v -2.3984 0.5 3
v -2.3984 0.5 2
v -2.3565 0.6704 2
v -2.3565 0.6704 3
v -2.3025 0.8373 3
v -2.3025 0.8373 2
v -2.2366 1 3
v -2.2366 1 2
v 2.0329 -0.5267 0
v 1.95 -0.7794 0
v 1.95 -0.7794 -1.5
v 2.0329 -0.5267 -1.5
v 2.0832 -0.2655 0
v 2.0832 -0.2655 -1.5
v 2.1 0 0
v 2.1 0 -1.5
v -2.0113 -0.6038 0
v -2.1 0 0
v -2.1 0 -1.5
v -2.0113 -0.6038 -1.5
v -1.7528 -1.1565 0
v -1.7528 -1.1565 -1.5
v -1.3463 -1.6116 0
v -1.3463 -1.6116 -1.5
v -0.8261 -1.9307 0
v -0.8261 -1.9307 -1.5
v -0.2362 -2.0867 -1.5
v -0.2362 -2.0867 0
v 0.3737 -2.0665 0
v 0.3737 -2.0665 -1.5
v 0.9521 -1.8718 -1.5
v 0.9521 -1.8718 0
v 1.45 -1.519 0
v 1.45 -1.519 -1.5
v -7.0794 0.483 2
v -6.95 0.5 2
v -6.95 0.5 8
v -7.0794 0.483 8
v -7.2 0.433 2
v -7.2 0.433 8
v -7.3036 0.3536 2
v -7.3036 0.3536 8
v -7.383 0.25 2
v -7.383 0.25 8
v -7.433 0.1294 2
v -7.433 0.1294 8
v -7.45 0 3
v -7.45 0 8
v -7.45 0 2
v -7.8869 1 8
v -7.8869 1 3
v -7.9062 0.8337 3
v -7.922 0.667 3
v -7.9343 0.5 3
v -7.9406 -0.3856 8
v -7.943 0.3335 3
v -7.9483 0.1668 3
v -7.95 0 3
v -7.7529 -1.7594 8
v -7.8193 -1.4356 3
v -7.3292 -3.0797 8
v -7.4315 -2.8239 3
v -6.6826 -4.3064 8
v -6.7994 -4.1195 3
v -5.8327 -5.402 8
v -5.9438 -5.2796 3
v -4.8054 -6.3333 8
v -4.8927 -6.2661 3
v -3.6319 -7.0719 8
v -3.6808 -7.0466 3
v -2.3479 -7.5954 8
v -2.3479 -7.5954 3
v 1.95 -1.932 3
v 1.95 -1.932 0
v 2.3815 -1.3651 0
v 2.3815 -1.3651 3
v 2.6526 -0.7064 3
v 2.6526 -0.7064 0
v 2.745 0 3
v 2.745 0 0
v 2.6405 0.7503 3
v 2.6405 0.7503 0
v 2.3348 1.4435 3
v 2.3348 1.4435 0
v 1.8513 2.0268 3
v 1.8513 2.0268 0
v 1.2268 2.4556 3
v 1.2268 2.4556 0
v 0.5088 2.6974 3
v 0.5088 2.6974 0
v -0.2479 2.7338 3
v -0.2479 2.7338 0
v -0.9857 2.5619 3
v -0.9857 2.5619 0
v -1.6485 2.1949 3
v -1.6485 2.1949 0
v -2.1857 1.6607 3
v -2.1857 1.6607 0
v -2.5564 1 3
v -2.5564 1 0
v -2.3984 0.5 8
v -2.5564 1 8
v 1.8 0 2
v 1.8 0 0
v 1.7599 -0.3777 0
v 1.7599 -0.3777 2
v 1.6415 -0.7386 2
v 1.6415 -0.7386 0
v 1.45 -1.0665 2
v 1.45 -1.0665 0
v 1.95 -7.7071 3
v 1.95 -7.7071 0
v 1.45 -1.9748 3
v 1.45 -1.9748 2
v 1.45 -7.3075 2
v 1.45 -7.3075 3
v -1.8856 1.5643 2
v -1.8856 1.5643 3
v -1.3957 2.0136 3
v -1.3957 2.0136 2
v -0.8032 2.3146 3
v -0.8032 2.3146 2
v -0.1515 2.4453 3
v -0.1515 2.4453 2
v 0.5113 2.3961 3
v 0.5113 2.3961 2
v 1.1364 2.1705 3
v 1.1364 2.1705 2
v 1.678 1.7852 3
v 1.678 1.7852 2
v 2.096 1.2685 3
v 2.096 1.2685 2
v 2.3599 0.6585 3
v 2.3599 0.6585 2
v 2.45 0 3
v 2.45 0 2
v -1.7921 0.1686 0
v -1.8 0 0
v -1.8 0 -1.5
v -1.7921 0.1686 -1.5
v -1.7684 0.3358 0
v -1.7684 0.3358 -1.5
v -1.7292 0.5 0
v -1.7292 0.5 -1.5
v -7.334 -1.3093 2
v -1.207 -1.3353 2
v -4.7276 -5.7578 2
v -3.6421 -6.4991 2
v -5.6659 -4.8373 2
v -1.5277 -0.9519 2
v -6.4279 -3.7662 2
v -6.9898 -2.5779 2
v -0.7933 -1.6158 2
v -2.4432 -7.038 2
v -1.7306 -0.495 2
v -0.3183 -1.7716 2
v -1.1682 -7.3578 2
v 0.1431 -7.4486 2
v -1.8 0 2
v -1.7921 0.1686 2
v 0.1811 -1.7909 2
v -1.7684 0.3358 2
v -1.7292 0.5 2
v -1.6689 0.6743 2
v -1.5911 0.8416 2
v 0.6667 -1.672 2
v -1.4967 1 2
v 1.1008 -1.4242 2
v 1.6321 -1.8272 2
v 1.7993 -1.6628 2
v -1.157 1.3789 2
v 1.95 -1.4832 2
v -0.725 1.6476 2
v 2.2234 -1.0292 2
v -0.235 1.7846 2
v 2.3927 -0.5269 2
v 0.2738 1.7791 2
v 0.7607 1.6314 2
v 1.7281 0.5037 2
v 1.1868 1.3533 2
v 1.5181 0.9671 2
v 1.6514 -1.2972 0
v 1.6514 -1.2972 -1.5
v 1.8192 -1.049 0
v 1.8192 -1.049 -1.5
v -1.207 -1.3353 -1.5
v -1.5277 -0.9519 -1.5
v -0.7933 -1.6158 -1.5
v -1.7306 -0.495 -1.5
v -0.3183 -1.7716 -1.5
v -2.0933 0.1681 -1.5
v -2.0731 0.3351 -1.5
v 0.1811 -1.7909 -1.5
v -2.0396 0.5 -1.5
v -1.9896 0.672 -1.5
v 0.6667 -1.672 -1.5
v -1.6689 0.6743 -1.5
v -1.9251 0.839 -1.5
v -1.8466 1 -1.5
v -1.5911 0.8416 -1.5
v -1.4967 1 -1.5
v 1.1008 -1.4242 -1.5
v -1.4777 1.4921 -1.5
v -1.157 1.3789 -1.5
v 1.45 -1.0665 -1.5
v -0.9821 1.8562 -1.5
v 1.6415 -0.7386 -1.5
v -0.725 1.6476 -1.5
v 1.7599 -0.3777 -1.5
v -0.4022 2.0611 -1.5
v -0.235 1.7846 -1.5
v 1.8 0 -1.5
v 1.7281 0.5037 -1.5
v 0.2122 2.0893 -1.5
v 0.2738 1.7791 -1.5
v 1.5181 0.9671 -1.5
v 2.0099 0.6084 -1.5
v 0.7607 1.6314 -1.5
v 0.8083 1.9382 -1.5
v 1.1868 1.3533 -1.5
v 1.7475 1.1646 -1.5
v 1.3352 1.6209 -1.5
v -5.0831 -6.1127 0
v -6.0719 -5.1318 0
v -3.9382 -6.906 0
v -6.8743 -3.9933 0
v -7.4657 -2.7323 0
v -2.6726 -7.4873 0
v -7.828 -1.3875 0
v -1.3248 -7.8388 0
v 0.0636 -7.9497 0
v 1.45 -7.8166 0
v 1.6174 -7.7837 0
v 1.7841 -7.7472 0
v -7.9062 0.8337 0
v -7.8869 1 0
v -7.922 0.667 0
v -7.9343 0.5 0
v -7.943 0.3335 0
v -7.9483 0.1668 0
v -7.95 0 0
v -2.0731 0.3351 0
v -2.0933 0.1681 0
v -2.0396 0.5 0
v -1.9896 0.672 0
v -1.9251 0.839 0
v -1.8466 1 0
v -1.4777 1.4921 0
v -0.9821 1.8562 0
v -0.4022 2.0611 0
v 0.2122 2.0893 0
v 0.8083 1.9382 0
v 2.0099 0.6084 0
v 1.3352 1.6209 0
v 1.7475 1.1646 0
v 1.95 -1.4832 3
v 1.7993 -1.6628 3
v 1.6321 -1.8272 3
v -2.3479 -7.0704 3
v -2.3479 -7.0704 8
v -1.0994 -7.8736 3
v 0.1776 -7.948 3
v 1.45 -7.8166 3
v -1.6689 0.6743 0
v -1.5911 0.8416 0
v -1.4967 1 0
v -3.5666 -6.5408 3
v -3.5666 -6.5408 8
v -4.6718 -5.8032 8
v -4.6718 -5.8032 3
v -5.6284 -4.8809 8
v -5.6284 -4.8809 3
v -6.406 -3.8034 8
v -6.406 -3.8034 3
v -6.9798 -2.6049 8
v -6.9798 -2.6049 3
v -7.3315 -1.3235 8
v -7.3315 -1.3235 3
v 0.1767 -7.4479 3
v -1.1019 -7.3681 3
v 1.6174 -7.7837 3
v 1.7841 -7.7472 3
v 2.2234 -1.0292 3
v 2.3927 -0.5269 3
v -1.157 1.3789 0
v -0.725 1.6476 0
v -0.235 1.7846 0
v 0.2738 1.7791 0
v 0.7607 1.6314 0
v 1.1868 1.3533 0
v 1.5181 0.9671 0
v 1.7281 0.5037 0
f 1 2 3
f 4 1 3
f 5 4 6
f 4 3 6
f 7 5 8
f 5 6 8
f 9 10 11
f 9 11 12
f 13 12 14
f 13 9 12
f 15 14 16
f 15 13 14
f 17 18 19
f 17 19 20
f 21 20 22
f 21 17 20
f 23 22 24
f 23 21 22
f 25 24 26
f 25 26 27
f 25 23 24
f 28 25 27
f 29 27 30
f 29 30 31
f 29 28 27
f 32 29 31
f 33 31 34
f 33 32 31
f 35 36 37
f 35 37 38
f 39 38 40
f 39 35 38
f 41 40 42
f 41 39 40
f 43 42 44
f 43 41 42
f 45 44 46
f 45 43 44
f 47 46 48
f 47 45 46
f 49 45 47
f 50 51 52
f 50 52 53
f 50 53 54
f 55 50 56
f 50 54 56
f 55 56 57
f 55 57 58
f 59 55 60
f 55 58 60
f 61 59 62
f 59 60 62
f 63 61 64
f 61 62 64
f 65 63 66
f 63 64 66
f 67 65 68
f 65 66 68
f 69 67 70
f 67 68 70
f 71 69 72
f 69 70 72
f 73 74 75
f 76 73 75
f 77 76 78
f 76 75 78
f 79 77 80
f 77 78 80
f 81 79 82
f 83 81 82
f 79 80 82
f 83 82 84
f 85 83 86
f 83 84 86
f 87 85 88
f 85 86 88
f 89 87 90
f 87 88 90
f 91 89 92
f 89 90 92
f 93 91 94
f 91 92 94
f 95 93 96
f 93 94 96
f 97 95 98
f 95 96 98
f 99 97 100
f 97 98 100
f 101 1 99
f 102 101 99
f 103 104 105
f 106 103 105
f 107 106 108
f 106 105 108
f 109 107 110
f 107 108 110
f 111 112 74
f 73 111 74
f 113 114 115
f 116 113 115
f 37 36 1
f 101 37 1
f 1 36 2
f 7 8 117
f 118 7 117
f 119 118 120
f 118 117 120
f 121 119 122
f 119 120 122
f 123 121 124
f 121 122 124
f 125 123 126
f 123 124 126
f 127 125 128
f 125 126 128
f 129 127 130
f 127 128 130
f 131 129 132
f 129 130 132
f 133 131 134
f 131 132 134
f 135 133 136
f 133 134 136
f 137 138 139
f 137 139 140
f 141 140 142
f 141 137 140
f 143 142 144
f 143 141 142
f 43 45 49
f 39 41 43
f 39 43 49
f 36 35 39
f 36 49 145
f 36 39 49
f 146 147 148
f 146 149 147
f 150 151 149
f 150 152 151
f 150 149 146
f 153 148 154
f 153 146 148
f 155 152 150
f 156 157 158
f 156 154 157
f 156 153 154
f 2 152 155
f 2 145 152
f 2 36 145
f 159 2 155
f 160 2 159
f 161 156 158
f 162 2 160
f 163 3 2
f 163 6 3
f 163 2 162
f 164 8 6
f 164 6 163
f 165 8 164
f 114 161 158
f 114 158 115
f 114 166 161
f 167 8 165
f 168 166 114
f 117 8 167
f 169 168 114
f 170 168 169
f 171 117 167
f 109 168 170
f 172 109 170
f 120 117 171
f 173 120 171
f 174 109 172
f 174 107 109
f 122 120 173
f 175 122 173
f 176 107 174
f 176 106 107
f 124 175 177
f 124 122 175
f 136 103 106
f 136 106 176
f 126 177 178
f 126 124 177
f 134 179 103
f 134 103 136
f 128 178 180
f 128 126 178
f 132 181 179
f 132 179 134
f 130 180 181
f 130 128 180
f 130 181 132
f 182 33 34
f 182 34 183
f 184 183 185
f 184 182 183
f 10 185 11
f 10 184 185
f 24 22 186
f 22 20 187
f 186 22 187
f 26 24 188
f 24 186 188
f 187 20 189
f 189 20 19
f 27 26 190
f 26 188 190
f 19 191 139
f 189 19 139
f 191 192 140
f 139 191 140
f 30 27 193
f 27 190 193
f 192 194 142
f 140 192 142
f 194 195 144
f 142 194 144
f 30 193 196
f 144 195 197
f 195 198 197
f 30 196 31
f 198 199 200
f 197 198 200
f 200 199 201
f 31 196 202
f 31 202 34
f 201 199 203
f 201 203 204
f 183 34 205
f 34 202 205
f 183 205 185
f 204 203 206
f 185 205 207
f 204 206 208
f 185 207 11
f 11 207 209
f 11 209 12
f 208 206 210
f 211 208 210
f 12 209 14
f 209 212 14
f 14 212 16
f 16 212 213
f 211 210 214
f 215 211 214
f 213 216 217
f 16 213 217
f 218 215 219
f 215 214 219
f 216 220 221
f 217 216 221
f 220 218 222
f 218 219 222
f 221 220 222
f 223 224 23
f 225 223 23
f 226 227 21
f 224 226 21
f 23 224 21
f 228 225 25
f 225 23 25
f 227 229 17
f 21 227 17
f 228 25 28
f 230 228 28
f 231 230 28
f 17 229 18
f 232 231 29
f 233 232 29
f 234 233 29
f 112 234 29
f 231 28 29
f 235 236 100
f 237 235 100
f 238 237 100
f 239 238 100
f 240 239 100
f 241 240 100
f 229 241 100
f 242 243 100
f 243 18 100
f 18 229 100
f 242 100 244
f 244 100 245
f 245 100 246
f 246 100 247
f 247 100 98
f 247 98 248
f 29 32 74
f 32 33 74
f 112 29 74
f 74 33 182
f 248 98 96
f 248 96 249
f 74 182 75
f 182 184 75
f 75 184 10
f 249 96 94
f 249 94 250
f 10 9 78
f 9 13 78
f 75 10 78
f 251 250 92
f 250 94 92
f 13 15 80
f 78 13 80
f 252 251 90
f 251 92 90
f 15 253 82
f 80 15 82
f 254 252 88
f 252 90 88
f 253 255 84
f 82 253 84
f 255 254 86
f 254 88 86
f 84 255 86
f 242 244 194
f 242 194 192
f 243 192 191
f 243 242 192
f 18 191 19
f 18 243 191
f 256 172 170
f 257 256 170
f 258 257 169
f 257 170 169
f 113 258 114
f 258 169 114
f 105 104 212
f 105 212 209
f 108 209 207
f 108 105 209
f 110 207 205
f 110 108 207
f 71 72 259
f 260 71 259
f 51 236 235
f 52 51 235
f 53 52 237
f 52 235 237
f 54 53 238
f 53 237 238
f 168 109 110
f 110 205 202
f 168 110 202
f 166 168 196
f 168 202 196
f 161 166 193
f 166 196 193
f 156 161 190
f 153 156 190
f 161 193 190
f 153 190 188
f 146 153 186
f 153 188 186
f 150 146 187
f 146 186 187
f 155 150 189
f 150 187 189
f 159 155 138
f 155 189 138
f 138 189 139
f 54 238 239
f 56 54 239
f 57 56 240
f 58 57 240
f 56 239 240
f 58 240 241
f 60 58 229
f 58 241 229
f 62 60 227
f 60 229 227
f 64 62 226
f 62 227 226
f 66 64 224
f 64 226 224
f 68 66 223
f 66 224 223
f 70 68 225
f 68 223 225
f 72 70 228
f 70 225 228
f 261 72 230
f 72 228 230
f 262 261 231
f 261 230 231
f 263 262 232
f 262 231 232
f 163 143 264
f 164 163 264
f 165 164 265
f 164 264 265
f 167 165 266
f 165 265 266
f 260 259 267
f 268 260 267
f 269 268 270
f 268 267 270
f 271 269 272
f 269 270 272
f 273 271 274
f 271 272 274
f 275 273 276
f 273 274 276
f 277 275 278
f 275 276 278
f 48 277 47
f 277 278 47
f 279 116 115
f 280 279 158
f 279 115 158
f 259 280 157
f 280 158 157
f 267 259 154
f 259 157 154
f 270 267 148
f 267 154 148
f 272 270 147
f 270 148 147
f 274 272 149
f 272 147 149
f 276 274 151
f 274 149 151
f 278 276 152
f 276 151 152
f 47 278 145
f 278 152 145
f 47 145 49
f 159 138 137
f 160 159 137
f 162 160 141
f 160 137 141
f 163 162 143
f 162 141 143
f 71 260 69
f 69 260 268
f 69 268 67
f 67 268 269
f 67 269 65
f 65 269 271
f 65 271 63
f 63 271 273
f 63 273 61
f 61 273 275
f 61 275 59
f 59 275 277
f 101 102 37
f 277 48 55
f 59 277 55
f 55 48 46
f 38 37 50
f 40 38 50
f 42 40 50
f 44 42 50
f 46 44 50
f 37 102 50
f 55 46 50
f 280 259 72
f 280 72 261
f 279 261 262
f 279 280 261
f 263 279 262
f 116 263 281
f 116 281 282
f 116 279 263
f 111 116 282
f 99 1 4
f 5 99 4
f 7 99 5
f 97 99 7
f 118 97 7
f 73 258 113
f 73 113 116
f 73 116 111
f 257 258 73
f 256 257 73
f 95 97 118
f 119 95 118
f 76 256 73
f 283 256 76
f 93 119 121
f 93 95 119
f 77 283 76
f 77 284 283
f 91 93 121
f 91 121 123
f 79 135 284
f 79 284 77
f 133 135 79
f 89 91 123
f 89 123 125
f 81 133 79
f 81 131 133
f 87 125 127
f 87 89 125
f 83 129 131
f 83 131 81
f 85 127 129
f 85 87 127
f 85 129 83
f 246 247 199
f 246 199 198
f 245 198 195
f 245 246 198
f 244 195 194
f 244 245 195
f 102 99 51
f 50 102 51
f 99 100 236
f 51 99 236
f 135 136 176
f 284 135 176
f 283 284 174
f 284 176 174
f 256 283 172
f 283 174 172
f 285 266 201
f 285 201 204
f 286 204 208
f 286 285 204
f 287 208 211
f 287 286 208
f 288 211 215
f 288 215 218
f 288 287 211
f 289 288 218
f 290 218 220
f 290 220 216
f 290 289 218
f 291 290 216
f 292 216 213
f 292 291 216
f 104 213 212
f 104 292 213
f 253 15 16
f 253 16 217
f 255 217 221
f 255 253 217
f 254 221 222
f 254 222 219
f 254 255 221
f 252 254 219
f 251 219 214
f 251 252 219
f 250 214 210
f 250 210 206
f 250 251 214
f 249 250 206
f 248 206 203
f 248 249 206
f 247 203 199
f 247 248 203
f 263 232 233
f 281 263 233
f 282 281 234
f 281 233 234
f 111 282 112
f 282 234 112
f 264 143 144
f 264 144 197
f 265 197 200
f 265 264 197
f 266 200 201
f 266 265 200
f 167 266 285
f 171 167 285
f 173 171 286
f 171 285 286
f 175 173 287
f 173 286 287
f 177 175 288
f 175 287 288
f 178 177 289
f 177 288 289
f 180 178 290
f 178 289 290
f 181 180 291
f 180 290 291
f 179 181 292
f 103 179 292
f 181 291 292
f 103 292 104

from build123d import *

# Parameters (mm, degrees)
F1_DEPTH    = 2
F2_DEPTH    = 3
F3_DEPTH    = 1.5
F5_DEPTH    = 5
F6_T1_DEPTH = 7.2507051877


# Not quite as in the source:
# - a fillet or chamfer that OpenCascade refuses, or shapes differently, is made with other operations: its cross-section is extruded or revolved along the edge and cut away or added
# - a feature names something its author has since deleted; it is built from what else it names


with BuildPart() as f1:
    # F0 (on Top) → F1 (new body)
    with BuildSketch(Plane.XY):
        with BuildLine():
            ThreePointArc((-2.398436991, 0.5), (-2.3309771289, 0.7543511281), (-2.2366269246, 1))
            Line((-2.2366269246, 1), (-2.556369496, 1))
            ThreePointArc((-2.556369496, 1), (-2.6395896521, 0.7533866658), (-2.6990785465, 0.5))
            Line((-2.6990785465, 0.5), (-2.398436991, 0.5))
        make_face()
        with BuildLine():
            ThreePointArc((-2.2366269246, 1), (0.5112553348, 2.3960630173), (2.45, 0))
            ThreePointArc((2.45, 0), (2.3216373532, -0.7826237921), (1.95, -1.4832396974))
            Line((1.95, -1.4832396974), (1.95, -1.9319743787))
            ThreePointArc((1.95, -1.9319743787), (2.5384813373, -1.0445752725), (2.745, 0))
            ThreePointArc((2.745, 0), (0.5088176164, 2.6974301906), (-2.556369496, 1))
            Line((-2.556369496, 1), (-2.2366269246, 1))
        make_face()
        with BuildLine():
            ThreePointArc((-2.6990785465, 0.5), (-2.6395896521, 0.7533866658), (-2.556369496, 1))
            Line((-2.556369496, 1), (-7.3825808495, 1))
            ThreePointArc((-7.3825808495, 1), (-7.4121089685, 0.7504269711), (-7.43320254, 0.5))
            Line((-7.43320254, 0.5), (-2.6990785465, 0.5))
        make_face()
        with BuildLine():
            ThreePointArc((-2.745, 0), (-2.7334955286, 0.2510521758), (-2.6990785465, 0.5))
            Line((-2.6990785465, 0.5), (-7.43320254, 0.5))
            ThreePointArc((-7.43320254, 0.5), (-7.4457994508, 0.2501410375), (-7.45, 0))
            Line((-7.45, 0), (-2.745, 0))
        make_face()
        with BuildLine():
            Line((1.45, -7.3075303626), (1.45, -2.3307777672))
            ThreePointArc((1.45, -2.3307777672), (-1.3331869711, -2.399507762), (-2.745, 0))
            Line((-2.745, 0), (-7.45, 0))
            ThreePointArc((-7.45, 0), (-4.7275786614, -5.7578207683), (1.45, -7.3075303626))
        make_face()
        with BuildLine():
            Line((1.45, -2.3307777672), (1.45, -1.9748417658))
            ThreePointArc((1.45, -1.9748417658), (-1.1067971811, -2.1857492994), (-2.45, 0))
            Line((-2.45, 0), (-2.745, 0))
            ThreePointArc((-2.745, 0), (-1.3331869711, -2.399507762), (1.45, -2.3307777672))
        make_face()
        with BuildLine():
            Line((1.95, -1.9319743787), (1.95, -1.4832396974))
            ThreePointArc((1.95, -1.4832396974), (1.7176781271, -1.7470208504), (1.45, -1.9748417658))
            Line((1.45, -1.9748417658), (1.45, -2.3307777672))
            ThreePointArc((1.45, -2.3307777672), (1.7116544732, -2.1459878761), (1.95, -1.9319743787))
        make_face()
        with BuildLine():
            ThreePointArc((-2.745, 0), (-2.7334955286, 0.2510521758), (-2.6990785465, 0.5))
            Line((-2.6990785465, 0.5), (-7.43320254, 0.5))
            ThreePointArc((-7.43320254, 0.5), (-7.4457994508, 0.2501410375), (-7.45, 0))
            Line((-7.45, 0), (-2.745, 0))
        make_face()
        with BuildLine():
            Line((1.45, -7.3075303626), (1.45, -2.3307777672))
            ThreePointArc((1.45, -2.3307777672), (-1.3331869711, -2.399507762), (-2.745, 0))
            Line((-2.745, 0), (-7.45, 0))
            ThreePointArc((-7.45, 0), (-4.7275786614, -5.7578207683), (1.45, -7.3075303626))
        make_face()
        with BuildLine():
            Line((1.95, -7.1902712049), (1.95, -1.9319743787))
            ThreePointArc((1.95, -1.9319743787), (1.7116544732, -2.1459878761), (1.45, -2.3307777672))
            Line((1.45, -2.3307777672), (1.45, -7.3075303626))
            ThreePointArc((1.45, -7.3075303626), (1.7010107076, -7.253210501), (1.95, -7.1902712049))
        make_face()
        with BuildLine():
            ThreePointArc((-7.43320254, 0.5), (-7.4121089685, 0.7504269711), (-7.3825808495, 1))
            Line((-7.3825808495, 1), (-7.8868561544, 1))
            ThreePointArc((-7.8868561544, 1), (-7.9145080827, 0.7503744455), (-7.9342611502, 0.5))
            Line((-7.9342611502, 0.5), (-7.43320254, 0.5))
        make_face()
        with BuildLine():
            Line((1.95, -7.7071395472), (1.95, -7.1902712049))
            ThreePointArc((1.95, -7.1902712049), (1.7010107076, -7.253210501), (1.45, -7.3075303626))
            Line((1.45, -7.3075303626), (1.45, -7.8166488983))
            ThreePointArc((1.45, -7.8166488983), (1.700881558, -7.7659192582), (1.95, -7.7071395472))
        make_face()
        with BuildLine():
            ThreePointArc((-2.745, 0), (-2.7334955286, 0.2510521758), (-2.6990785465, 0.5))
            Line((-2.6990785465, 0.5), (-7.43320254, 0.5))
            ThreePointArc((-7.43320254, 0.5), (-7.4457994508, 0.2501410375), (-7.45, 0))
            Line((-7.45, 0), (-2.745, 0))
        make_face()
        with BuildLine():
            Line((1.45, -7.3075303626), (1.45, -2.3307777672))
            ThreePointArc((1.45, -2.3307777672), (-1.3331869711, -2.399507762), (-2.745, 0))
            Line((-2.745, 0), (-7.45, 0))
            ThreePointArc((-7.45, 0), (-4.7275786614, -5.7578207683), (1.45, -7.3075303626))
        make_face()
        with BuildLine():
            Line((1.95, -7.1902712049), (1.95, -1.9319743787))
            ThreePointArc((1.95, -1.9319743787), (1.7116544732, -2.1459878761), (1.45, -2.3307777672))
            Line((1.45, -2.3307777672), (1.45, -7.3075303626))
            ThreePointArc((1.45, -7.3075303626), (1.7010107076, -7.253210501), (1.95, -7.1902712049))
        make_face()
        with BuildLine():
            ThreePointArc((-7.43320254, 0.5), (-7.4121089685, 0.7504269711), (-7.3825808495, 1))
            Line((-7.3825808495, 1), (-7.8868561544, 1))
            ThreePointArc((-7.8868561544, 1), (-7.9145080827, 0.7503744455), (-7.9342611502, 0.5))
            Line((-7.9342611502, 0.5), (-7.43320254, 0.5))
        make_face()
        with BuildLine():
            Line((1.45, -7.8166488983), (1.45, -7.3075303626))
            ThreePointArc((1.45, -7.3075303626), (-4.7275786614, -5.7578207683), (-7.45, 0))
            Line((-7.45, 0), (-7.95, 0))
            ThreePointArc((-7.95, 0), (-5.0830601019, -6.1126917148), (1.45, -7.8166488983))
        make_face()
        with BuildLine():
            Line((1.95, -7.7071395472), (1.95, -7.1902712049))
            ThreePointArc((1.95, -7.1902712049), (1.7010107076, -7.253210501), (1.45, -7.3075303626))
            Line((1.45, -7.3075303626), (1.45, -7.8166488983))
            ThreePointArc((1.45, -7.8166488983), (1.700881558, -7.7659192582), (1.95, -7.7071395472))
        make_face()
        with BuildLine():
            ThreePointArc((-7.45, 0), (-7.4457994508, 0.2501410375), (-7.43320254, 0.5))
            Line((-7.43320254, 0.5), (-7.9342611502, 0.5))
            ThreePointArc((-7.9342611502, 0.5), (-7.9460643134, 0.250123825), (-7.95, 0))
            Line((-7.95, 0), (-7.45, 0))
        make_face()
        with BuildLine():
            ThreePointArc((-2.45, 0), (-2.4370751556, 0.2513258562), (-2.398436991, 0.5))
            Line((-2.398436991, 0.5), (-2.6990785465, 0.5))
            ThreePointArc((-2.6990785465, 0.5), (-2.7334955286, 0.2510521758), (-2.745, 0))
            Line((-2.745, 0), (-2.45, 0))
        make_face()
        with BuildLine():
            ThreePointArc((-2.45, 0), (-1.1067971811, -2.1857492994), (1.45, -1.9748417658))
            Line((1.45, -1.9748417658), (1.45, -1.5190457531))
            ThreePointArc((1.45, -1.5190457531), (-0.8261355821, -1.9306734576), (-2.1, 0))
            Line((-2.1, 0), (-2.45, 0))
        make_face()
        with BuildLine():
            ThreePointArc((-2.1, 0), (-0.8261355821, -1.9306734576), (1.45, -1.5190457531))
            Line((1.45, -1.5190457531), (1.45, -1.0665364504))
            ThreePointArc((1.45, -1.0665364504), (-0.561248608, -1.7102631376), (-1.8, 0))
            Line((-1.8, 0), (-2.1, 0))
        make_face()
        with BuildLine():
            Line((-2.0396078054, 0.5), (-2.398436991, 0.5))
            ThreePointArc((-2.398436991, 0.5), (-2.4370751556, 0.2513258562), (-2.45, 0))
            Line((-2.45, 0), (-2.1, 0))
            ThreePointArc((-2.1, 0), (-2.0848472835, 0.2518170056), (-2.0396078054, 0.5))
        make_face()
        with BuildLine():
            Line((-1.8466185313, 1), (-2.2366269246, 1))
            ThreePointArc((-2.2366269246, 1), (-2.3309771289, 0.7543511281), (-2.398436991, 0.5))
            Line((-2.398436991, 0.5), (-2.0396078054, 0.5))
            ThreePointArc((-2.0396078054, 0.5), (-1.9591295988, 0.7561819986), (-1.8466185313, 1))
        make_face()
        with BuildLine():
            Line((2.1, 0), (2.45, 0))
            ThreePointArc((2.45, 0), (0.5112553348, 2.3960630173), (-2.2366269246, 1))
            Line((-2.2366269246, 1), (-1.8466185313, 1))
            ThreePointArc((-1.8466185313, 1), (0.5158008745, 2.0356692899), (2.1, 0))
        make_face()
        with BuildLine():
            Line((-1.7291616466, 0.5), (-2.0396078054, 0.5))
            ThreePointArc((-2.0396078054, 0.5), (-2.0848472835, 0.2518170056), (-2.1, 0))
            Line((-2.1, 0), (-1.8, 0))
            ThreePointArc((-1.8, 0), (-1.7822024245, 0.2524965704), (-1.7291616466, 0.5))
        make_face()
        with BuildLine():
            Line((-1.4966629547, 1), (-1.8466185313, 1))
            ThreePointArc((-1.8466185313, 1), (-1.9591295988, 0.7561819986), (-2.0396078054, 0.5))
            Line((-2.0396078054, 0.5), (-1.7291616466, 0.5))
            ThreePointArc((-1.7291616466, 0.5), (-1.6321721997, 0.7589558027), (-1.4966629547, 1))
        make_face()
        with BuildLine():
            Line((1.95, 0), (2.1, 0))
            ThreePointArc((2.1, 0), (0.5158008745, 2.0356692899), (-1.8466185313, 1))
            Line((-1.8466185313, 1), (-1.4966629547, 1))
            ThreePointArc((-1.4966629547, 1), (0.522497216, 1.722497216), (1.8, 0))
            Line((1.8, 0), (1.95, 0))
        make_face()
        with BuildLine():
            ThreePointArc((1.45, -1.5190457531), (1.739758749, -1.176112025), (1.95, -0.7794228634))
            Line((1.95, -0.7794228634), (1.95, 0))
            Line((1.95, 0), (1.8, 0))
            ThreePointArc((1.8, 0), (1.7102631376, -0.561248608), (1.45, -1.0665364504))
            Line((1.45, -1.0665364504), (1.45, -1.5190457531))
        make_face()
        with BuildLine():
            ThreePointArc((1.45, -1.9748417658), (1.7176781271, -1.7470208504), (1.95, -1.4832396974))
            Line((1.95, -1.4832396974), (1.95, -0.7794228634))
            ThreePointArc((1.95, -0.7794228634), (1.739758749, -1.176112025), (1.45, -1.5190457531))
            Line((1.45, -1.5190457531), (1.45, -1.9748417658))
        make_face()
        with BuildLine():
            ThreePointArc((1.95, -0.7794228634), (2.0621590627, -0.3968626967), (2.1, 0))
            Line((2.1, 0), (1.95, 0))
            Line((1.95, 0), (1.95, -0.7794228634))
        make_face()
        with BuildLine():
            ThreePointArc((1.95, -1.4832396974), (2.3216373532, -0.7826237921), (2.45, 0))
            Line((2.45, 0), (2.1, 0))
            ThreePointArc((2.1, 0), (2.0621590627, -0.3968626967), (1.95, -0.7794228634))
            Line((1.95, -0.7794228634), (1.95, -1.4832396974))
        make_face()
    extrude(amount=F1_DEPTH)

    # F0 (on Top) → F2 (join)
    with BuildSketch(Plane.XY):
        with BuildLine():
            ThreePointArc((-7.43320254, 0.5), (-7.4121089685, 0.7504269711), (-7.3825808495, 1))
            Line((-7.3825808495, 1), (-7.8868561544, 1))
            ThreePointArc((-7.8868561544, 1), (-7.9145080827, 0.7503744455), (-7.9342611502, 0.5))
            Line((-7.9342611502, 0.5), (-7.43320254, 0.5))
        make_face()
        with BuildLine():
            ThreePointArc((-2.6990785465, 0.5), (-2.6395896521, 0.7533866658), (-2.556369496, 1))
            Line((-2.556369496, 1), (-7.3825808495, 1))
            ThreePointArc((-7.3825808495, 1), (-7.4121089685, 0.7504269711), (-7.43320254, 0.5))
            Line((-7.43320254, 0.5), (-2.6990785465, 0.5))
        make_face()
        with BuildLine():
            ThreePointArc((-2.398436991, 0.5), (-2.3309771289, 0.7543511281), (-2.2366269246, 1))
            Line((-2.2366269246, 1), (-2.556369496, 1))
            ThreePointArc((-2.556369496, 1), (-2.6395896521, 0.7533866658), (-2.6990785465, 0.5))
            Line((-2.6990785465, 0.5), (-2.398436991, 0.5))
        make_face()
        with BuildLine():
            ThreePointArc((-2.2366269246, 1), (0.5112553348, 2.3960630173), (2.45, 0))
            ThreePointArc((2.45, 0), (2.3216373532, -0.7826237921), (1.95, -1.4832396974))
            Line((1.95, -1.4832396974), (1.95, -1.9319743787))
            ThreePointArc((1.95, -1.9319743787), (2.5384813373, -1.0445752725), (2.745, 0))
            ThreePointArc((2.745, 0), (0.5088176164, 2.6974301906), (-2.556369496, 1))
            Line((-2.556369496, 1), (-2.2366269246, 1))
        make_face()
        with BuildLine():
            Line((1.95, -1.9319743787), (1.95, -1.4832396974))
            ThreePointArc((1.95, -1.4832396974), (1.7176781271, -1.7470208504), (1.45, -1.9748417658))
            Line((1.45, -1.9748417658), (1.45, -2.3307777672))
            ThreePointArc((1.45, -2.3307777672), (1.7116544732, -2.1459878761), (1.95, -1.9319743787))
        make_face()
        with BuildLine():
            Line((1.95, -7.1902712049), (1.95, -1.9319743787))
            ThreePointArc((1.95, -1.9319743787), (1.7116544732, -2.1459878761), (1.45, -2.3307777672))
            Line((1.45, -2.3307777672), (1.45, -7.3075303626))
            ThreePointArc((1.45, -7.3075303626), (1.7010107076, -7.253210501), (1.95, -7.1902712049))
        make_face()
        with BuildLine():
            Line((1.95, -7.7071395472), (1.95, -7.1902712049))
            ThreePointArc((1.95, -7.1902712049), (1.7010107076, -7.253210501), (1.45, -7.3075303626))
            Line((1.45, -7.3075303626), (1.45, -7.8166488983))
            ThreePointArc((1.45, -7.8166488983), (1.700881558, -7.7659192582), (1.95, -7.7071395472))
        make_face()
        with BuildLine():
            Line((1.45, -7.8166488983), (1.45, -7.3075303626))
            ThreePointArc((1.45, -7.3075303626), (-4.7275786614, -5.7578207683), (-7.45, 0))
            Line((-7.45, 0), (-7.95, 0))
            ThreePointArc((-7.95, 0), (-5.0830601019, -6.1126917148), (1.45, -7.8166488983))
        make_face()
        with BuildLine():
            ThreePointArc((-7.45, 0), (-7.4457994508, 0.2501410375), (-7.43320254, 0.5))
            Line((-7.43320254, 0.5), (-7.9342611502, 0.5))
            ThreePointArc((-7.9342611502, 0.5), (-7.9460643134, 0.250123825), (-7.95, 0))
            Line((-7.95, 0), (-7.45, 0))
        make_face()
    extrude(amount=F2_DEPTH)

    # F0 (on Top) → F3 (join)
    with BuildSketch(Plane.XY):
        with BuildLine():
            Line((1.95, 0), (2.1, 0))
            ThreePointArc((2.1, 0), (0.5158008745, 2.0356692899), (-1.8466185313, 1))
            Line((-1.8466185313, 1), (-1.4966629547, 1))
            ThreePointArc((-1.4966629547, 1), (0.522497216, 1.722497216), (1.8, 0))
            Line((1.8, 0), (1.95, 0))
        make_face()
        with BuildLine():
            Line((-1.4966629547, 1), (-1.8466185313, 1))
            ThreePointArc((-1.8466185313, 1), (-1.9591295988, 0.7561819986), (-2.0396078054, 0.5))
            Line((-2.0396078054, 0.5), (-1.7291616466, 0.5))
            ThreePointArc((-1.7291616466, 0.5), (-1.6321721997, 0.7589558027), (-1.4966629547, 1))
        make_face()
        with BuildLine():
            Line((-1.7291616466, 0.5), (-2.0396078054, 0.5))
            ThreePointArc((-2.0396078054, 0.5), (-2.0848472835, 0.2518170056), (-2.1, 0))
            Line((-2.1, 0), (-1.8, 0))
            ThreePointArc((-1.8, 0), (-1.7822024245, 0.2524965704), (-1.7291616466, 0.5))
        make_face()
        with BuildLine():
            ThreePointArc((-2.1, 0), (-0.8261355821, -1.9306734576), (1.45, -1.5190457531))
            Line((1.45, -1.5190457531), (1.45, -1.0665364504))
            ThreePointArc((1.45, -1.0665364504), (-0.561248608, -1.7102631376), (-1.8, 0))
            Line((-1.8, 0), (-2.1, 0))
        make_face()
        with BuildLine():
            ThreePointArc((1.45, -1.5190457531), (1.739758749, -1.176112025), (1.95, -0.7794228634))
            Line((1.95, -0.7794228634), (1.95, 0))
            Line((1.95, 0), (1.8, 0))
            ThreePointArc((1.8, 0), (1.7102631376, -0.561248608), (1.45, -1.0665364504))
            Line((1.45, -1.0665364504), (1.45, -1.5190457531))
        make_face()
        with BuildLine():
            ThreePointArc((1.95, -0.7794228634), (2.0621590627, -0.3968626967), (2.1, 0))
            Line((2.1, 0), (1.95, 0))
            Line((1.95, 0), (1.95, -0.7794228634))
        make_face()
    extrude(amount=-F3_DEPTH)

    # F4 (on face) → F5 (join)
    with BuildSketch(Plane.XY.offset(3)):
        with BuildLine():
            Line((-2.398436991, 0.5), (-2.556369496, 1))
            Line((-2.556369496, 1), (-7.8868561544, 1))
            ThreePointArc((-7.8868561544, 1), (-6.6826334673, -4.3063801437), (-2.3478664886, -7.5953948516))
            Line((-2.3478664886, -7.5953948516), (-2.3478664886, -7.0703622928))
            ThreePointArc((-2.3478664886, -7.0703622928), (-6.1842480664, -4.154223857), (-7.43320254, 0.5))
            Line((-7.43320254, 0.5), (-2.398436991, 0.5))
        make_face()
    extrude(amount=F5_DEPTH)

    # F6: fillet of radius 0.5 on 1 edges, made by hand

    # F6_s2 → F6_t1 (join)
    with BuildSketch(Plane.XY.offset(0.7492948123)):
        with BuildLine():
            ThreePointArc((-6.95, 0.5), (-7.3035533906, 0.3535533906), (-7.45, 0))
            ThreePointArc((-7.45, 0), (-7.4457994508, 0.2501410375), (-7.43320254, 0.5))
            Line((-7.43320254, 0.5), (-6.95, 0.5))
        make_face()
    extrude(amount=F6_T1_DEPTH)


solid = f1.part
